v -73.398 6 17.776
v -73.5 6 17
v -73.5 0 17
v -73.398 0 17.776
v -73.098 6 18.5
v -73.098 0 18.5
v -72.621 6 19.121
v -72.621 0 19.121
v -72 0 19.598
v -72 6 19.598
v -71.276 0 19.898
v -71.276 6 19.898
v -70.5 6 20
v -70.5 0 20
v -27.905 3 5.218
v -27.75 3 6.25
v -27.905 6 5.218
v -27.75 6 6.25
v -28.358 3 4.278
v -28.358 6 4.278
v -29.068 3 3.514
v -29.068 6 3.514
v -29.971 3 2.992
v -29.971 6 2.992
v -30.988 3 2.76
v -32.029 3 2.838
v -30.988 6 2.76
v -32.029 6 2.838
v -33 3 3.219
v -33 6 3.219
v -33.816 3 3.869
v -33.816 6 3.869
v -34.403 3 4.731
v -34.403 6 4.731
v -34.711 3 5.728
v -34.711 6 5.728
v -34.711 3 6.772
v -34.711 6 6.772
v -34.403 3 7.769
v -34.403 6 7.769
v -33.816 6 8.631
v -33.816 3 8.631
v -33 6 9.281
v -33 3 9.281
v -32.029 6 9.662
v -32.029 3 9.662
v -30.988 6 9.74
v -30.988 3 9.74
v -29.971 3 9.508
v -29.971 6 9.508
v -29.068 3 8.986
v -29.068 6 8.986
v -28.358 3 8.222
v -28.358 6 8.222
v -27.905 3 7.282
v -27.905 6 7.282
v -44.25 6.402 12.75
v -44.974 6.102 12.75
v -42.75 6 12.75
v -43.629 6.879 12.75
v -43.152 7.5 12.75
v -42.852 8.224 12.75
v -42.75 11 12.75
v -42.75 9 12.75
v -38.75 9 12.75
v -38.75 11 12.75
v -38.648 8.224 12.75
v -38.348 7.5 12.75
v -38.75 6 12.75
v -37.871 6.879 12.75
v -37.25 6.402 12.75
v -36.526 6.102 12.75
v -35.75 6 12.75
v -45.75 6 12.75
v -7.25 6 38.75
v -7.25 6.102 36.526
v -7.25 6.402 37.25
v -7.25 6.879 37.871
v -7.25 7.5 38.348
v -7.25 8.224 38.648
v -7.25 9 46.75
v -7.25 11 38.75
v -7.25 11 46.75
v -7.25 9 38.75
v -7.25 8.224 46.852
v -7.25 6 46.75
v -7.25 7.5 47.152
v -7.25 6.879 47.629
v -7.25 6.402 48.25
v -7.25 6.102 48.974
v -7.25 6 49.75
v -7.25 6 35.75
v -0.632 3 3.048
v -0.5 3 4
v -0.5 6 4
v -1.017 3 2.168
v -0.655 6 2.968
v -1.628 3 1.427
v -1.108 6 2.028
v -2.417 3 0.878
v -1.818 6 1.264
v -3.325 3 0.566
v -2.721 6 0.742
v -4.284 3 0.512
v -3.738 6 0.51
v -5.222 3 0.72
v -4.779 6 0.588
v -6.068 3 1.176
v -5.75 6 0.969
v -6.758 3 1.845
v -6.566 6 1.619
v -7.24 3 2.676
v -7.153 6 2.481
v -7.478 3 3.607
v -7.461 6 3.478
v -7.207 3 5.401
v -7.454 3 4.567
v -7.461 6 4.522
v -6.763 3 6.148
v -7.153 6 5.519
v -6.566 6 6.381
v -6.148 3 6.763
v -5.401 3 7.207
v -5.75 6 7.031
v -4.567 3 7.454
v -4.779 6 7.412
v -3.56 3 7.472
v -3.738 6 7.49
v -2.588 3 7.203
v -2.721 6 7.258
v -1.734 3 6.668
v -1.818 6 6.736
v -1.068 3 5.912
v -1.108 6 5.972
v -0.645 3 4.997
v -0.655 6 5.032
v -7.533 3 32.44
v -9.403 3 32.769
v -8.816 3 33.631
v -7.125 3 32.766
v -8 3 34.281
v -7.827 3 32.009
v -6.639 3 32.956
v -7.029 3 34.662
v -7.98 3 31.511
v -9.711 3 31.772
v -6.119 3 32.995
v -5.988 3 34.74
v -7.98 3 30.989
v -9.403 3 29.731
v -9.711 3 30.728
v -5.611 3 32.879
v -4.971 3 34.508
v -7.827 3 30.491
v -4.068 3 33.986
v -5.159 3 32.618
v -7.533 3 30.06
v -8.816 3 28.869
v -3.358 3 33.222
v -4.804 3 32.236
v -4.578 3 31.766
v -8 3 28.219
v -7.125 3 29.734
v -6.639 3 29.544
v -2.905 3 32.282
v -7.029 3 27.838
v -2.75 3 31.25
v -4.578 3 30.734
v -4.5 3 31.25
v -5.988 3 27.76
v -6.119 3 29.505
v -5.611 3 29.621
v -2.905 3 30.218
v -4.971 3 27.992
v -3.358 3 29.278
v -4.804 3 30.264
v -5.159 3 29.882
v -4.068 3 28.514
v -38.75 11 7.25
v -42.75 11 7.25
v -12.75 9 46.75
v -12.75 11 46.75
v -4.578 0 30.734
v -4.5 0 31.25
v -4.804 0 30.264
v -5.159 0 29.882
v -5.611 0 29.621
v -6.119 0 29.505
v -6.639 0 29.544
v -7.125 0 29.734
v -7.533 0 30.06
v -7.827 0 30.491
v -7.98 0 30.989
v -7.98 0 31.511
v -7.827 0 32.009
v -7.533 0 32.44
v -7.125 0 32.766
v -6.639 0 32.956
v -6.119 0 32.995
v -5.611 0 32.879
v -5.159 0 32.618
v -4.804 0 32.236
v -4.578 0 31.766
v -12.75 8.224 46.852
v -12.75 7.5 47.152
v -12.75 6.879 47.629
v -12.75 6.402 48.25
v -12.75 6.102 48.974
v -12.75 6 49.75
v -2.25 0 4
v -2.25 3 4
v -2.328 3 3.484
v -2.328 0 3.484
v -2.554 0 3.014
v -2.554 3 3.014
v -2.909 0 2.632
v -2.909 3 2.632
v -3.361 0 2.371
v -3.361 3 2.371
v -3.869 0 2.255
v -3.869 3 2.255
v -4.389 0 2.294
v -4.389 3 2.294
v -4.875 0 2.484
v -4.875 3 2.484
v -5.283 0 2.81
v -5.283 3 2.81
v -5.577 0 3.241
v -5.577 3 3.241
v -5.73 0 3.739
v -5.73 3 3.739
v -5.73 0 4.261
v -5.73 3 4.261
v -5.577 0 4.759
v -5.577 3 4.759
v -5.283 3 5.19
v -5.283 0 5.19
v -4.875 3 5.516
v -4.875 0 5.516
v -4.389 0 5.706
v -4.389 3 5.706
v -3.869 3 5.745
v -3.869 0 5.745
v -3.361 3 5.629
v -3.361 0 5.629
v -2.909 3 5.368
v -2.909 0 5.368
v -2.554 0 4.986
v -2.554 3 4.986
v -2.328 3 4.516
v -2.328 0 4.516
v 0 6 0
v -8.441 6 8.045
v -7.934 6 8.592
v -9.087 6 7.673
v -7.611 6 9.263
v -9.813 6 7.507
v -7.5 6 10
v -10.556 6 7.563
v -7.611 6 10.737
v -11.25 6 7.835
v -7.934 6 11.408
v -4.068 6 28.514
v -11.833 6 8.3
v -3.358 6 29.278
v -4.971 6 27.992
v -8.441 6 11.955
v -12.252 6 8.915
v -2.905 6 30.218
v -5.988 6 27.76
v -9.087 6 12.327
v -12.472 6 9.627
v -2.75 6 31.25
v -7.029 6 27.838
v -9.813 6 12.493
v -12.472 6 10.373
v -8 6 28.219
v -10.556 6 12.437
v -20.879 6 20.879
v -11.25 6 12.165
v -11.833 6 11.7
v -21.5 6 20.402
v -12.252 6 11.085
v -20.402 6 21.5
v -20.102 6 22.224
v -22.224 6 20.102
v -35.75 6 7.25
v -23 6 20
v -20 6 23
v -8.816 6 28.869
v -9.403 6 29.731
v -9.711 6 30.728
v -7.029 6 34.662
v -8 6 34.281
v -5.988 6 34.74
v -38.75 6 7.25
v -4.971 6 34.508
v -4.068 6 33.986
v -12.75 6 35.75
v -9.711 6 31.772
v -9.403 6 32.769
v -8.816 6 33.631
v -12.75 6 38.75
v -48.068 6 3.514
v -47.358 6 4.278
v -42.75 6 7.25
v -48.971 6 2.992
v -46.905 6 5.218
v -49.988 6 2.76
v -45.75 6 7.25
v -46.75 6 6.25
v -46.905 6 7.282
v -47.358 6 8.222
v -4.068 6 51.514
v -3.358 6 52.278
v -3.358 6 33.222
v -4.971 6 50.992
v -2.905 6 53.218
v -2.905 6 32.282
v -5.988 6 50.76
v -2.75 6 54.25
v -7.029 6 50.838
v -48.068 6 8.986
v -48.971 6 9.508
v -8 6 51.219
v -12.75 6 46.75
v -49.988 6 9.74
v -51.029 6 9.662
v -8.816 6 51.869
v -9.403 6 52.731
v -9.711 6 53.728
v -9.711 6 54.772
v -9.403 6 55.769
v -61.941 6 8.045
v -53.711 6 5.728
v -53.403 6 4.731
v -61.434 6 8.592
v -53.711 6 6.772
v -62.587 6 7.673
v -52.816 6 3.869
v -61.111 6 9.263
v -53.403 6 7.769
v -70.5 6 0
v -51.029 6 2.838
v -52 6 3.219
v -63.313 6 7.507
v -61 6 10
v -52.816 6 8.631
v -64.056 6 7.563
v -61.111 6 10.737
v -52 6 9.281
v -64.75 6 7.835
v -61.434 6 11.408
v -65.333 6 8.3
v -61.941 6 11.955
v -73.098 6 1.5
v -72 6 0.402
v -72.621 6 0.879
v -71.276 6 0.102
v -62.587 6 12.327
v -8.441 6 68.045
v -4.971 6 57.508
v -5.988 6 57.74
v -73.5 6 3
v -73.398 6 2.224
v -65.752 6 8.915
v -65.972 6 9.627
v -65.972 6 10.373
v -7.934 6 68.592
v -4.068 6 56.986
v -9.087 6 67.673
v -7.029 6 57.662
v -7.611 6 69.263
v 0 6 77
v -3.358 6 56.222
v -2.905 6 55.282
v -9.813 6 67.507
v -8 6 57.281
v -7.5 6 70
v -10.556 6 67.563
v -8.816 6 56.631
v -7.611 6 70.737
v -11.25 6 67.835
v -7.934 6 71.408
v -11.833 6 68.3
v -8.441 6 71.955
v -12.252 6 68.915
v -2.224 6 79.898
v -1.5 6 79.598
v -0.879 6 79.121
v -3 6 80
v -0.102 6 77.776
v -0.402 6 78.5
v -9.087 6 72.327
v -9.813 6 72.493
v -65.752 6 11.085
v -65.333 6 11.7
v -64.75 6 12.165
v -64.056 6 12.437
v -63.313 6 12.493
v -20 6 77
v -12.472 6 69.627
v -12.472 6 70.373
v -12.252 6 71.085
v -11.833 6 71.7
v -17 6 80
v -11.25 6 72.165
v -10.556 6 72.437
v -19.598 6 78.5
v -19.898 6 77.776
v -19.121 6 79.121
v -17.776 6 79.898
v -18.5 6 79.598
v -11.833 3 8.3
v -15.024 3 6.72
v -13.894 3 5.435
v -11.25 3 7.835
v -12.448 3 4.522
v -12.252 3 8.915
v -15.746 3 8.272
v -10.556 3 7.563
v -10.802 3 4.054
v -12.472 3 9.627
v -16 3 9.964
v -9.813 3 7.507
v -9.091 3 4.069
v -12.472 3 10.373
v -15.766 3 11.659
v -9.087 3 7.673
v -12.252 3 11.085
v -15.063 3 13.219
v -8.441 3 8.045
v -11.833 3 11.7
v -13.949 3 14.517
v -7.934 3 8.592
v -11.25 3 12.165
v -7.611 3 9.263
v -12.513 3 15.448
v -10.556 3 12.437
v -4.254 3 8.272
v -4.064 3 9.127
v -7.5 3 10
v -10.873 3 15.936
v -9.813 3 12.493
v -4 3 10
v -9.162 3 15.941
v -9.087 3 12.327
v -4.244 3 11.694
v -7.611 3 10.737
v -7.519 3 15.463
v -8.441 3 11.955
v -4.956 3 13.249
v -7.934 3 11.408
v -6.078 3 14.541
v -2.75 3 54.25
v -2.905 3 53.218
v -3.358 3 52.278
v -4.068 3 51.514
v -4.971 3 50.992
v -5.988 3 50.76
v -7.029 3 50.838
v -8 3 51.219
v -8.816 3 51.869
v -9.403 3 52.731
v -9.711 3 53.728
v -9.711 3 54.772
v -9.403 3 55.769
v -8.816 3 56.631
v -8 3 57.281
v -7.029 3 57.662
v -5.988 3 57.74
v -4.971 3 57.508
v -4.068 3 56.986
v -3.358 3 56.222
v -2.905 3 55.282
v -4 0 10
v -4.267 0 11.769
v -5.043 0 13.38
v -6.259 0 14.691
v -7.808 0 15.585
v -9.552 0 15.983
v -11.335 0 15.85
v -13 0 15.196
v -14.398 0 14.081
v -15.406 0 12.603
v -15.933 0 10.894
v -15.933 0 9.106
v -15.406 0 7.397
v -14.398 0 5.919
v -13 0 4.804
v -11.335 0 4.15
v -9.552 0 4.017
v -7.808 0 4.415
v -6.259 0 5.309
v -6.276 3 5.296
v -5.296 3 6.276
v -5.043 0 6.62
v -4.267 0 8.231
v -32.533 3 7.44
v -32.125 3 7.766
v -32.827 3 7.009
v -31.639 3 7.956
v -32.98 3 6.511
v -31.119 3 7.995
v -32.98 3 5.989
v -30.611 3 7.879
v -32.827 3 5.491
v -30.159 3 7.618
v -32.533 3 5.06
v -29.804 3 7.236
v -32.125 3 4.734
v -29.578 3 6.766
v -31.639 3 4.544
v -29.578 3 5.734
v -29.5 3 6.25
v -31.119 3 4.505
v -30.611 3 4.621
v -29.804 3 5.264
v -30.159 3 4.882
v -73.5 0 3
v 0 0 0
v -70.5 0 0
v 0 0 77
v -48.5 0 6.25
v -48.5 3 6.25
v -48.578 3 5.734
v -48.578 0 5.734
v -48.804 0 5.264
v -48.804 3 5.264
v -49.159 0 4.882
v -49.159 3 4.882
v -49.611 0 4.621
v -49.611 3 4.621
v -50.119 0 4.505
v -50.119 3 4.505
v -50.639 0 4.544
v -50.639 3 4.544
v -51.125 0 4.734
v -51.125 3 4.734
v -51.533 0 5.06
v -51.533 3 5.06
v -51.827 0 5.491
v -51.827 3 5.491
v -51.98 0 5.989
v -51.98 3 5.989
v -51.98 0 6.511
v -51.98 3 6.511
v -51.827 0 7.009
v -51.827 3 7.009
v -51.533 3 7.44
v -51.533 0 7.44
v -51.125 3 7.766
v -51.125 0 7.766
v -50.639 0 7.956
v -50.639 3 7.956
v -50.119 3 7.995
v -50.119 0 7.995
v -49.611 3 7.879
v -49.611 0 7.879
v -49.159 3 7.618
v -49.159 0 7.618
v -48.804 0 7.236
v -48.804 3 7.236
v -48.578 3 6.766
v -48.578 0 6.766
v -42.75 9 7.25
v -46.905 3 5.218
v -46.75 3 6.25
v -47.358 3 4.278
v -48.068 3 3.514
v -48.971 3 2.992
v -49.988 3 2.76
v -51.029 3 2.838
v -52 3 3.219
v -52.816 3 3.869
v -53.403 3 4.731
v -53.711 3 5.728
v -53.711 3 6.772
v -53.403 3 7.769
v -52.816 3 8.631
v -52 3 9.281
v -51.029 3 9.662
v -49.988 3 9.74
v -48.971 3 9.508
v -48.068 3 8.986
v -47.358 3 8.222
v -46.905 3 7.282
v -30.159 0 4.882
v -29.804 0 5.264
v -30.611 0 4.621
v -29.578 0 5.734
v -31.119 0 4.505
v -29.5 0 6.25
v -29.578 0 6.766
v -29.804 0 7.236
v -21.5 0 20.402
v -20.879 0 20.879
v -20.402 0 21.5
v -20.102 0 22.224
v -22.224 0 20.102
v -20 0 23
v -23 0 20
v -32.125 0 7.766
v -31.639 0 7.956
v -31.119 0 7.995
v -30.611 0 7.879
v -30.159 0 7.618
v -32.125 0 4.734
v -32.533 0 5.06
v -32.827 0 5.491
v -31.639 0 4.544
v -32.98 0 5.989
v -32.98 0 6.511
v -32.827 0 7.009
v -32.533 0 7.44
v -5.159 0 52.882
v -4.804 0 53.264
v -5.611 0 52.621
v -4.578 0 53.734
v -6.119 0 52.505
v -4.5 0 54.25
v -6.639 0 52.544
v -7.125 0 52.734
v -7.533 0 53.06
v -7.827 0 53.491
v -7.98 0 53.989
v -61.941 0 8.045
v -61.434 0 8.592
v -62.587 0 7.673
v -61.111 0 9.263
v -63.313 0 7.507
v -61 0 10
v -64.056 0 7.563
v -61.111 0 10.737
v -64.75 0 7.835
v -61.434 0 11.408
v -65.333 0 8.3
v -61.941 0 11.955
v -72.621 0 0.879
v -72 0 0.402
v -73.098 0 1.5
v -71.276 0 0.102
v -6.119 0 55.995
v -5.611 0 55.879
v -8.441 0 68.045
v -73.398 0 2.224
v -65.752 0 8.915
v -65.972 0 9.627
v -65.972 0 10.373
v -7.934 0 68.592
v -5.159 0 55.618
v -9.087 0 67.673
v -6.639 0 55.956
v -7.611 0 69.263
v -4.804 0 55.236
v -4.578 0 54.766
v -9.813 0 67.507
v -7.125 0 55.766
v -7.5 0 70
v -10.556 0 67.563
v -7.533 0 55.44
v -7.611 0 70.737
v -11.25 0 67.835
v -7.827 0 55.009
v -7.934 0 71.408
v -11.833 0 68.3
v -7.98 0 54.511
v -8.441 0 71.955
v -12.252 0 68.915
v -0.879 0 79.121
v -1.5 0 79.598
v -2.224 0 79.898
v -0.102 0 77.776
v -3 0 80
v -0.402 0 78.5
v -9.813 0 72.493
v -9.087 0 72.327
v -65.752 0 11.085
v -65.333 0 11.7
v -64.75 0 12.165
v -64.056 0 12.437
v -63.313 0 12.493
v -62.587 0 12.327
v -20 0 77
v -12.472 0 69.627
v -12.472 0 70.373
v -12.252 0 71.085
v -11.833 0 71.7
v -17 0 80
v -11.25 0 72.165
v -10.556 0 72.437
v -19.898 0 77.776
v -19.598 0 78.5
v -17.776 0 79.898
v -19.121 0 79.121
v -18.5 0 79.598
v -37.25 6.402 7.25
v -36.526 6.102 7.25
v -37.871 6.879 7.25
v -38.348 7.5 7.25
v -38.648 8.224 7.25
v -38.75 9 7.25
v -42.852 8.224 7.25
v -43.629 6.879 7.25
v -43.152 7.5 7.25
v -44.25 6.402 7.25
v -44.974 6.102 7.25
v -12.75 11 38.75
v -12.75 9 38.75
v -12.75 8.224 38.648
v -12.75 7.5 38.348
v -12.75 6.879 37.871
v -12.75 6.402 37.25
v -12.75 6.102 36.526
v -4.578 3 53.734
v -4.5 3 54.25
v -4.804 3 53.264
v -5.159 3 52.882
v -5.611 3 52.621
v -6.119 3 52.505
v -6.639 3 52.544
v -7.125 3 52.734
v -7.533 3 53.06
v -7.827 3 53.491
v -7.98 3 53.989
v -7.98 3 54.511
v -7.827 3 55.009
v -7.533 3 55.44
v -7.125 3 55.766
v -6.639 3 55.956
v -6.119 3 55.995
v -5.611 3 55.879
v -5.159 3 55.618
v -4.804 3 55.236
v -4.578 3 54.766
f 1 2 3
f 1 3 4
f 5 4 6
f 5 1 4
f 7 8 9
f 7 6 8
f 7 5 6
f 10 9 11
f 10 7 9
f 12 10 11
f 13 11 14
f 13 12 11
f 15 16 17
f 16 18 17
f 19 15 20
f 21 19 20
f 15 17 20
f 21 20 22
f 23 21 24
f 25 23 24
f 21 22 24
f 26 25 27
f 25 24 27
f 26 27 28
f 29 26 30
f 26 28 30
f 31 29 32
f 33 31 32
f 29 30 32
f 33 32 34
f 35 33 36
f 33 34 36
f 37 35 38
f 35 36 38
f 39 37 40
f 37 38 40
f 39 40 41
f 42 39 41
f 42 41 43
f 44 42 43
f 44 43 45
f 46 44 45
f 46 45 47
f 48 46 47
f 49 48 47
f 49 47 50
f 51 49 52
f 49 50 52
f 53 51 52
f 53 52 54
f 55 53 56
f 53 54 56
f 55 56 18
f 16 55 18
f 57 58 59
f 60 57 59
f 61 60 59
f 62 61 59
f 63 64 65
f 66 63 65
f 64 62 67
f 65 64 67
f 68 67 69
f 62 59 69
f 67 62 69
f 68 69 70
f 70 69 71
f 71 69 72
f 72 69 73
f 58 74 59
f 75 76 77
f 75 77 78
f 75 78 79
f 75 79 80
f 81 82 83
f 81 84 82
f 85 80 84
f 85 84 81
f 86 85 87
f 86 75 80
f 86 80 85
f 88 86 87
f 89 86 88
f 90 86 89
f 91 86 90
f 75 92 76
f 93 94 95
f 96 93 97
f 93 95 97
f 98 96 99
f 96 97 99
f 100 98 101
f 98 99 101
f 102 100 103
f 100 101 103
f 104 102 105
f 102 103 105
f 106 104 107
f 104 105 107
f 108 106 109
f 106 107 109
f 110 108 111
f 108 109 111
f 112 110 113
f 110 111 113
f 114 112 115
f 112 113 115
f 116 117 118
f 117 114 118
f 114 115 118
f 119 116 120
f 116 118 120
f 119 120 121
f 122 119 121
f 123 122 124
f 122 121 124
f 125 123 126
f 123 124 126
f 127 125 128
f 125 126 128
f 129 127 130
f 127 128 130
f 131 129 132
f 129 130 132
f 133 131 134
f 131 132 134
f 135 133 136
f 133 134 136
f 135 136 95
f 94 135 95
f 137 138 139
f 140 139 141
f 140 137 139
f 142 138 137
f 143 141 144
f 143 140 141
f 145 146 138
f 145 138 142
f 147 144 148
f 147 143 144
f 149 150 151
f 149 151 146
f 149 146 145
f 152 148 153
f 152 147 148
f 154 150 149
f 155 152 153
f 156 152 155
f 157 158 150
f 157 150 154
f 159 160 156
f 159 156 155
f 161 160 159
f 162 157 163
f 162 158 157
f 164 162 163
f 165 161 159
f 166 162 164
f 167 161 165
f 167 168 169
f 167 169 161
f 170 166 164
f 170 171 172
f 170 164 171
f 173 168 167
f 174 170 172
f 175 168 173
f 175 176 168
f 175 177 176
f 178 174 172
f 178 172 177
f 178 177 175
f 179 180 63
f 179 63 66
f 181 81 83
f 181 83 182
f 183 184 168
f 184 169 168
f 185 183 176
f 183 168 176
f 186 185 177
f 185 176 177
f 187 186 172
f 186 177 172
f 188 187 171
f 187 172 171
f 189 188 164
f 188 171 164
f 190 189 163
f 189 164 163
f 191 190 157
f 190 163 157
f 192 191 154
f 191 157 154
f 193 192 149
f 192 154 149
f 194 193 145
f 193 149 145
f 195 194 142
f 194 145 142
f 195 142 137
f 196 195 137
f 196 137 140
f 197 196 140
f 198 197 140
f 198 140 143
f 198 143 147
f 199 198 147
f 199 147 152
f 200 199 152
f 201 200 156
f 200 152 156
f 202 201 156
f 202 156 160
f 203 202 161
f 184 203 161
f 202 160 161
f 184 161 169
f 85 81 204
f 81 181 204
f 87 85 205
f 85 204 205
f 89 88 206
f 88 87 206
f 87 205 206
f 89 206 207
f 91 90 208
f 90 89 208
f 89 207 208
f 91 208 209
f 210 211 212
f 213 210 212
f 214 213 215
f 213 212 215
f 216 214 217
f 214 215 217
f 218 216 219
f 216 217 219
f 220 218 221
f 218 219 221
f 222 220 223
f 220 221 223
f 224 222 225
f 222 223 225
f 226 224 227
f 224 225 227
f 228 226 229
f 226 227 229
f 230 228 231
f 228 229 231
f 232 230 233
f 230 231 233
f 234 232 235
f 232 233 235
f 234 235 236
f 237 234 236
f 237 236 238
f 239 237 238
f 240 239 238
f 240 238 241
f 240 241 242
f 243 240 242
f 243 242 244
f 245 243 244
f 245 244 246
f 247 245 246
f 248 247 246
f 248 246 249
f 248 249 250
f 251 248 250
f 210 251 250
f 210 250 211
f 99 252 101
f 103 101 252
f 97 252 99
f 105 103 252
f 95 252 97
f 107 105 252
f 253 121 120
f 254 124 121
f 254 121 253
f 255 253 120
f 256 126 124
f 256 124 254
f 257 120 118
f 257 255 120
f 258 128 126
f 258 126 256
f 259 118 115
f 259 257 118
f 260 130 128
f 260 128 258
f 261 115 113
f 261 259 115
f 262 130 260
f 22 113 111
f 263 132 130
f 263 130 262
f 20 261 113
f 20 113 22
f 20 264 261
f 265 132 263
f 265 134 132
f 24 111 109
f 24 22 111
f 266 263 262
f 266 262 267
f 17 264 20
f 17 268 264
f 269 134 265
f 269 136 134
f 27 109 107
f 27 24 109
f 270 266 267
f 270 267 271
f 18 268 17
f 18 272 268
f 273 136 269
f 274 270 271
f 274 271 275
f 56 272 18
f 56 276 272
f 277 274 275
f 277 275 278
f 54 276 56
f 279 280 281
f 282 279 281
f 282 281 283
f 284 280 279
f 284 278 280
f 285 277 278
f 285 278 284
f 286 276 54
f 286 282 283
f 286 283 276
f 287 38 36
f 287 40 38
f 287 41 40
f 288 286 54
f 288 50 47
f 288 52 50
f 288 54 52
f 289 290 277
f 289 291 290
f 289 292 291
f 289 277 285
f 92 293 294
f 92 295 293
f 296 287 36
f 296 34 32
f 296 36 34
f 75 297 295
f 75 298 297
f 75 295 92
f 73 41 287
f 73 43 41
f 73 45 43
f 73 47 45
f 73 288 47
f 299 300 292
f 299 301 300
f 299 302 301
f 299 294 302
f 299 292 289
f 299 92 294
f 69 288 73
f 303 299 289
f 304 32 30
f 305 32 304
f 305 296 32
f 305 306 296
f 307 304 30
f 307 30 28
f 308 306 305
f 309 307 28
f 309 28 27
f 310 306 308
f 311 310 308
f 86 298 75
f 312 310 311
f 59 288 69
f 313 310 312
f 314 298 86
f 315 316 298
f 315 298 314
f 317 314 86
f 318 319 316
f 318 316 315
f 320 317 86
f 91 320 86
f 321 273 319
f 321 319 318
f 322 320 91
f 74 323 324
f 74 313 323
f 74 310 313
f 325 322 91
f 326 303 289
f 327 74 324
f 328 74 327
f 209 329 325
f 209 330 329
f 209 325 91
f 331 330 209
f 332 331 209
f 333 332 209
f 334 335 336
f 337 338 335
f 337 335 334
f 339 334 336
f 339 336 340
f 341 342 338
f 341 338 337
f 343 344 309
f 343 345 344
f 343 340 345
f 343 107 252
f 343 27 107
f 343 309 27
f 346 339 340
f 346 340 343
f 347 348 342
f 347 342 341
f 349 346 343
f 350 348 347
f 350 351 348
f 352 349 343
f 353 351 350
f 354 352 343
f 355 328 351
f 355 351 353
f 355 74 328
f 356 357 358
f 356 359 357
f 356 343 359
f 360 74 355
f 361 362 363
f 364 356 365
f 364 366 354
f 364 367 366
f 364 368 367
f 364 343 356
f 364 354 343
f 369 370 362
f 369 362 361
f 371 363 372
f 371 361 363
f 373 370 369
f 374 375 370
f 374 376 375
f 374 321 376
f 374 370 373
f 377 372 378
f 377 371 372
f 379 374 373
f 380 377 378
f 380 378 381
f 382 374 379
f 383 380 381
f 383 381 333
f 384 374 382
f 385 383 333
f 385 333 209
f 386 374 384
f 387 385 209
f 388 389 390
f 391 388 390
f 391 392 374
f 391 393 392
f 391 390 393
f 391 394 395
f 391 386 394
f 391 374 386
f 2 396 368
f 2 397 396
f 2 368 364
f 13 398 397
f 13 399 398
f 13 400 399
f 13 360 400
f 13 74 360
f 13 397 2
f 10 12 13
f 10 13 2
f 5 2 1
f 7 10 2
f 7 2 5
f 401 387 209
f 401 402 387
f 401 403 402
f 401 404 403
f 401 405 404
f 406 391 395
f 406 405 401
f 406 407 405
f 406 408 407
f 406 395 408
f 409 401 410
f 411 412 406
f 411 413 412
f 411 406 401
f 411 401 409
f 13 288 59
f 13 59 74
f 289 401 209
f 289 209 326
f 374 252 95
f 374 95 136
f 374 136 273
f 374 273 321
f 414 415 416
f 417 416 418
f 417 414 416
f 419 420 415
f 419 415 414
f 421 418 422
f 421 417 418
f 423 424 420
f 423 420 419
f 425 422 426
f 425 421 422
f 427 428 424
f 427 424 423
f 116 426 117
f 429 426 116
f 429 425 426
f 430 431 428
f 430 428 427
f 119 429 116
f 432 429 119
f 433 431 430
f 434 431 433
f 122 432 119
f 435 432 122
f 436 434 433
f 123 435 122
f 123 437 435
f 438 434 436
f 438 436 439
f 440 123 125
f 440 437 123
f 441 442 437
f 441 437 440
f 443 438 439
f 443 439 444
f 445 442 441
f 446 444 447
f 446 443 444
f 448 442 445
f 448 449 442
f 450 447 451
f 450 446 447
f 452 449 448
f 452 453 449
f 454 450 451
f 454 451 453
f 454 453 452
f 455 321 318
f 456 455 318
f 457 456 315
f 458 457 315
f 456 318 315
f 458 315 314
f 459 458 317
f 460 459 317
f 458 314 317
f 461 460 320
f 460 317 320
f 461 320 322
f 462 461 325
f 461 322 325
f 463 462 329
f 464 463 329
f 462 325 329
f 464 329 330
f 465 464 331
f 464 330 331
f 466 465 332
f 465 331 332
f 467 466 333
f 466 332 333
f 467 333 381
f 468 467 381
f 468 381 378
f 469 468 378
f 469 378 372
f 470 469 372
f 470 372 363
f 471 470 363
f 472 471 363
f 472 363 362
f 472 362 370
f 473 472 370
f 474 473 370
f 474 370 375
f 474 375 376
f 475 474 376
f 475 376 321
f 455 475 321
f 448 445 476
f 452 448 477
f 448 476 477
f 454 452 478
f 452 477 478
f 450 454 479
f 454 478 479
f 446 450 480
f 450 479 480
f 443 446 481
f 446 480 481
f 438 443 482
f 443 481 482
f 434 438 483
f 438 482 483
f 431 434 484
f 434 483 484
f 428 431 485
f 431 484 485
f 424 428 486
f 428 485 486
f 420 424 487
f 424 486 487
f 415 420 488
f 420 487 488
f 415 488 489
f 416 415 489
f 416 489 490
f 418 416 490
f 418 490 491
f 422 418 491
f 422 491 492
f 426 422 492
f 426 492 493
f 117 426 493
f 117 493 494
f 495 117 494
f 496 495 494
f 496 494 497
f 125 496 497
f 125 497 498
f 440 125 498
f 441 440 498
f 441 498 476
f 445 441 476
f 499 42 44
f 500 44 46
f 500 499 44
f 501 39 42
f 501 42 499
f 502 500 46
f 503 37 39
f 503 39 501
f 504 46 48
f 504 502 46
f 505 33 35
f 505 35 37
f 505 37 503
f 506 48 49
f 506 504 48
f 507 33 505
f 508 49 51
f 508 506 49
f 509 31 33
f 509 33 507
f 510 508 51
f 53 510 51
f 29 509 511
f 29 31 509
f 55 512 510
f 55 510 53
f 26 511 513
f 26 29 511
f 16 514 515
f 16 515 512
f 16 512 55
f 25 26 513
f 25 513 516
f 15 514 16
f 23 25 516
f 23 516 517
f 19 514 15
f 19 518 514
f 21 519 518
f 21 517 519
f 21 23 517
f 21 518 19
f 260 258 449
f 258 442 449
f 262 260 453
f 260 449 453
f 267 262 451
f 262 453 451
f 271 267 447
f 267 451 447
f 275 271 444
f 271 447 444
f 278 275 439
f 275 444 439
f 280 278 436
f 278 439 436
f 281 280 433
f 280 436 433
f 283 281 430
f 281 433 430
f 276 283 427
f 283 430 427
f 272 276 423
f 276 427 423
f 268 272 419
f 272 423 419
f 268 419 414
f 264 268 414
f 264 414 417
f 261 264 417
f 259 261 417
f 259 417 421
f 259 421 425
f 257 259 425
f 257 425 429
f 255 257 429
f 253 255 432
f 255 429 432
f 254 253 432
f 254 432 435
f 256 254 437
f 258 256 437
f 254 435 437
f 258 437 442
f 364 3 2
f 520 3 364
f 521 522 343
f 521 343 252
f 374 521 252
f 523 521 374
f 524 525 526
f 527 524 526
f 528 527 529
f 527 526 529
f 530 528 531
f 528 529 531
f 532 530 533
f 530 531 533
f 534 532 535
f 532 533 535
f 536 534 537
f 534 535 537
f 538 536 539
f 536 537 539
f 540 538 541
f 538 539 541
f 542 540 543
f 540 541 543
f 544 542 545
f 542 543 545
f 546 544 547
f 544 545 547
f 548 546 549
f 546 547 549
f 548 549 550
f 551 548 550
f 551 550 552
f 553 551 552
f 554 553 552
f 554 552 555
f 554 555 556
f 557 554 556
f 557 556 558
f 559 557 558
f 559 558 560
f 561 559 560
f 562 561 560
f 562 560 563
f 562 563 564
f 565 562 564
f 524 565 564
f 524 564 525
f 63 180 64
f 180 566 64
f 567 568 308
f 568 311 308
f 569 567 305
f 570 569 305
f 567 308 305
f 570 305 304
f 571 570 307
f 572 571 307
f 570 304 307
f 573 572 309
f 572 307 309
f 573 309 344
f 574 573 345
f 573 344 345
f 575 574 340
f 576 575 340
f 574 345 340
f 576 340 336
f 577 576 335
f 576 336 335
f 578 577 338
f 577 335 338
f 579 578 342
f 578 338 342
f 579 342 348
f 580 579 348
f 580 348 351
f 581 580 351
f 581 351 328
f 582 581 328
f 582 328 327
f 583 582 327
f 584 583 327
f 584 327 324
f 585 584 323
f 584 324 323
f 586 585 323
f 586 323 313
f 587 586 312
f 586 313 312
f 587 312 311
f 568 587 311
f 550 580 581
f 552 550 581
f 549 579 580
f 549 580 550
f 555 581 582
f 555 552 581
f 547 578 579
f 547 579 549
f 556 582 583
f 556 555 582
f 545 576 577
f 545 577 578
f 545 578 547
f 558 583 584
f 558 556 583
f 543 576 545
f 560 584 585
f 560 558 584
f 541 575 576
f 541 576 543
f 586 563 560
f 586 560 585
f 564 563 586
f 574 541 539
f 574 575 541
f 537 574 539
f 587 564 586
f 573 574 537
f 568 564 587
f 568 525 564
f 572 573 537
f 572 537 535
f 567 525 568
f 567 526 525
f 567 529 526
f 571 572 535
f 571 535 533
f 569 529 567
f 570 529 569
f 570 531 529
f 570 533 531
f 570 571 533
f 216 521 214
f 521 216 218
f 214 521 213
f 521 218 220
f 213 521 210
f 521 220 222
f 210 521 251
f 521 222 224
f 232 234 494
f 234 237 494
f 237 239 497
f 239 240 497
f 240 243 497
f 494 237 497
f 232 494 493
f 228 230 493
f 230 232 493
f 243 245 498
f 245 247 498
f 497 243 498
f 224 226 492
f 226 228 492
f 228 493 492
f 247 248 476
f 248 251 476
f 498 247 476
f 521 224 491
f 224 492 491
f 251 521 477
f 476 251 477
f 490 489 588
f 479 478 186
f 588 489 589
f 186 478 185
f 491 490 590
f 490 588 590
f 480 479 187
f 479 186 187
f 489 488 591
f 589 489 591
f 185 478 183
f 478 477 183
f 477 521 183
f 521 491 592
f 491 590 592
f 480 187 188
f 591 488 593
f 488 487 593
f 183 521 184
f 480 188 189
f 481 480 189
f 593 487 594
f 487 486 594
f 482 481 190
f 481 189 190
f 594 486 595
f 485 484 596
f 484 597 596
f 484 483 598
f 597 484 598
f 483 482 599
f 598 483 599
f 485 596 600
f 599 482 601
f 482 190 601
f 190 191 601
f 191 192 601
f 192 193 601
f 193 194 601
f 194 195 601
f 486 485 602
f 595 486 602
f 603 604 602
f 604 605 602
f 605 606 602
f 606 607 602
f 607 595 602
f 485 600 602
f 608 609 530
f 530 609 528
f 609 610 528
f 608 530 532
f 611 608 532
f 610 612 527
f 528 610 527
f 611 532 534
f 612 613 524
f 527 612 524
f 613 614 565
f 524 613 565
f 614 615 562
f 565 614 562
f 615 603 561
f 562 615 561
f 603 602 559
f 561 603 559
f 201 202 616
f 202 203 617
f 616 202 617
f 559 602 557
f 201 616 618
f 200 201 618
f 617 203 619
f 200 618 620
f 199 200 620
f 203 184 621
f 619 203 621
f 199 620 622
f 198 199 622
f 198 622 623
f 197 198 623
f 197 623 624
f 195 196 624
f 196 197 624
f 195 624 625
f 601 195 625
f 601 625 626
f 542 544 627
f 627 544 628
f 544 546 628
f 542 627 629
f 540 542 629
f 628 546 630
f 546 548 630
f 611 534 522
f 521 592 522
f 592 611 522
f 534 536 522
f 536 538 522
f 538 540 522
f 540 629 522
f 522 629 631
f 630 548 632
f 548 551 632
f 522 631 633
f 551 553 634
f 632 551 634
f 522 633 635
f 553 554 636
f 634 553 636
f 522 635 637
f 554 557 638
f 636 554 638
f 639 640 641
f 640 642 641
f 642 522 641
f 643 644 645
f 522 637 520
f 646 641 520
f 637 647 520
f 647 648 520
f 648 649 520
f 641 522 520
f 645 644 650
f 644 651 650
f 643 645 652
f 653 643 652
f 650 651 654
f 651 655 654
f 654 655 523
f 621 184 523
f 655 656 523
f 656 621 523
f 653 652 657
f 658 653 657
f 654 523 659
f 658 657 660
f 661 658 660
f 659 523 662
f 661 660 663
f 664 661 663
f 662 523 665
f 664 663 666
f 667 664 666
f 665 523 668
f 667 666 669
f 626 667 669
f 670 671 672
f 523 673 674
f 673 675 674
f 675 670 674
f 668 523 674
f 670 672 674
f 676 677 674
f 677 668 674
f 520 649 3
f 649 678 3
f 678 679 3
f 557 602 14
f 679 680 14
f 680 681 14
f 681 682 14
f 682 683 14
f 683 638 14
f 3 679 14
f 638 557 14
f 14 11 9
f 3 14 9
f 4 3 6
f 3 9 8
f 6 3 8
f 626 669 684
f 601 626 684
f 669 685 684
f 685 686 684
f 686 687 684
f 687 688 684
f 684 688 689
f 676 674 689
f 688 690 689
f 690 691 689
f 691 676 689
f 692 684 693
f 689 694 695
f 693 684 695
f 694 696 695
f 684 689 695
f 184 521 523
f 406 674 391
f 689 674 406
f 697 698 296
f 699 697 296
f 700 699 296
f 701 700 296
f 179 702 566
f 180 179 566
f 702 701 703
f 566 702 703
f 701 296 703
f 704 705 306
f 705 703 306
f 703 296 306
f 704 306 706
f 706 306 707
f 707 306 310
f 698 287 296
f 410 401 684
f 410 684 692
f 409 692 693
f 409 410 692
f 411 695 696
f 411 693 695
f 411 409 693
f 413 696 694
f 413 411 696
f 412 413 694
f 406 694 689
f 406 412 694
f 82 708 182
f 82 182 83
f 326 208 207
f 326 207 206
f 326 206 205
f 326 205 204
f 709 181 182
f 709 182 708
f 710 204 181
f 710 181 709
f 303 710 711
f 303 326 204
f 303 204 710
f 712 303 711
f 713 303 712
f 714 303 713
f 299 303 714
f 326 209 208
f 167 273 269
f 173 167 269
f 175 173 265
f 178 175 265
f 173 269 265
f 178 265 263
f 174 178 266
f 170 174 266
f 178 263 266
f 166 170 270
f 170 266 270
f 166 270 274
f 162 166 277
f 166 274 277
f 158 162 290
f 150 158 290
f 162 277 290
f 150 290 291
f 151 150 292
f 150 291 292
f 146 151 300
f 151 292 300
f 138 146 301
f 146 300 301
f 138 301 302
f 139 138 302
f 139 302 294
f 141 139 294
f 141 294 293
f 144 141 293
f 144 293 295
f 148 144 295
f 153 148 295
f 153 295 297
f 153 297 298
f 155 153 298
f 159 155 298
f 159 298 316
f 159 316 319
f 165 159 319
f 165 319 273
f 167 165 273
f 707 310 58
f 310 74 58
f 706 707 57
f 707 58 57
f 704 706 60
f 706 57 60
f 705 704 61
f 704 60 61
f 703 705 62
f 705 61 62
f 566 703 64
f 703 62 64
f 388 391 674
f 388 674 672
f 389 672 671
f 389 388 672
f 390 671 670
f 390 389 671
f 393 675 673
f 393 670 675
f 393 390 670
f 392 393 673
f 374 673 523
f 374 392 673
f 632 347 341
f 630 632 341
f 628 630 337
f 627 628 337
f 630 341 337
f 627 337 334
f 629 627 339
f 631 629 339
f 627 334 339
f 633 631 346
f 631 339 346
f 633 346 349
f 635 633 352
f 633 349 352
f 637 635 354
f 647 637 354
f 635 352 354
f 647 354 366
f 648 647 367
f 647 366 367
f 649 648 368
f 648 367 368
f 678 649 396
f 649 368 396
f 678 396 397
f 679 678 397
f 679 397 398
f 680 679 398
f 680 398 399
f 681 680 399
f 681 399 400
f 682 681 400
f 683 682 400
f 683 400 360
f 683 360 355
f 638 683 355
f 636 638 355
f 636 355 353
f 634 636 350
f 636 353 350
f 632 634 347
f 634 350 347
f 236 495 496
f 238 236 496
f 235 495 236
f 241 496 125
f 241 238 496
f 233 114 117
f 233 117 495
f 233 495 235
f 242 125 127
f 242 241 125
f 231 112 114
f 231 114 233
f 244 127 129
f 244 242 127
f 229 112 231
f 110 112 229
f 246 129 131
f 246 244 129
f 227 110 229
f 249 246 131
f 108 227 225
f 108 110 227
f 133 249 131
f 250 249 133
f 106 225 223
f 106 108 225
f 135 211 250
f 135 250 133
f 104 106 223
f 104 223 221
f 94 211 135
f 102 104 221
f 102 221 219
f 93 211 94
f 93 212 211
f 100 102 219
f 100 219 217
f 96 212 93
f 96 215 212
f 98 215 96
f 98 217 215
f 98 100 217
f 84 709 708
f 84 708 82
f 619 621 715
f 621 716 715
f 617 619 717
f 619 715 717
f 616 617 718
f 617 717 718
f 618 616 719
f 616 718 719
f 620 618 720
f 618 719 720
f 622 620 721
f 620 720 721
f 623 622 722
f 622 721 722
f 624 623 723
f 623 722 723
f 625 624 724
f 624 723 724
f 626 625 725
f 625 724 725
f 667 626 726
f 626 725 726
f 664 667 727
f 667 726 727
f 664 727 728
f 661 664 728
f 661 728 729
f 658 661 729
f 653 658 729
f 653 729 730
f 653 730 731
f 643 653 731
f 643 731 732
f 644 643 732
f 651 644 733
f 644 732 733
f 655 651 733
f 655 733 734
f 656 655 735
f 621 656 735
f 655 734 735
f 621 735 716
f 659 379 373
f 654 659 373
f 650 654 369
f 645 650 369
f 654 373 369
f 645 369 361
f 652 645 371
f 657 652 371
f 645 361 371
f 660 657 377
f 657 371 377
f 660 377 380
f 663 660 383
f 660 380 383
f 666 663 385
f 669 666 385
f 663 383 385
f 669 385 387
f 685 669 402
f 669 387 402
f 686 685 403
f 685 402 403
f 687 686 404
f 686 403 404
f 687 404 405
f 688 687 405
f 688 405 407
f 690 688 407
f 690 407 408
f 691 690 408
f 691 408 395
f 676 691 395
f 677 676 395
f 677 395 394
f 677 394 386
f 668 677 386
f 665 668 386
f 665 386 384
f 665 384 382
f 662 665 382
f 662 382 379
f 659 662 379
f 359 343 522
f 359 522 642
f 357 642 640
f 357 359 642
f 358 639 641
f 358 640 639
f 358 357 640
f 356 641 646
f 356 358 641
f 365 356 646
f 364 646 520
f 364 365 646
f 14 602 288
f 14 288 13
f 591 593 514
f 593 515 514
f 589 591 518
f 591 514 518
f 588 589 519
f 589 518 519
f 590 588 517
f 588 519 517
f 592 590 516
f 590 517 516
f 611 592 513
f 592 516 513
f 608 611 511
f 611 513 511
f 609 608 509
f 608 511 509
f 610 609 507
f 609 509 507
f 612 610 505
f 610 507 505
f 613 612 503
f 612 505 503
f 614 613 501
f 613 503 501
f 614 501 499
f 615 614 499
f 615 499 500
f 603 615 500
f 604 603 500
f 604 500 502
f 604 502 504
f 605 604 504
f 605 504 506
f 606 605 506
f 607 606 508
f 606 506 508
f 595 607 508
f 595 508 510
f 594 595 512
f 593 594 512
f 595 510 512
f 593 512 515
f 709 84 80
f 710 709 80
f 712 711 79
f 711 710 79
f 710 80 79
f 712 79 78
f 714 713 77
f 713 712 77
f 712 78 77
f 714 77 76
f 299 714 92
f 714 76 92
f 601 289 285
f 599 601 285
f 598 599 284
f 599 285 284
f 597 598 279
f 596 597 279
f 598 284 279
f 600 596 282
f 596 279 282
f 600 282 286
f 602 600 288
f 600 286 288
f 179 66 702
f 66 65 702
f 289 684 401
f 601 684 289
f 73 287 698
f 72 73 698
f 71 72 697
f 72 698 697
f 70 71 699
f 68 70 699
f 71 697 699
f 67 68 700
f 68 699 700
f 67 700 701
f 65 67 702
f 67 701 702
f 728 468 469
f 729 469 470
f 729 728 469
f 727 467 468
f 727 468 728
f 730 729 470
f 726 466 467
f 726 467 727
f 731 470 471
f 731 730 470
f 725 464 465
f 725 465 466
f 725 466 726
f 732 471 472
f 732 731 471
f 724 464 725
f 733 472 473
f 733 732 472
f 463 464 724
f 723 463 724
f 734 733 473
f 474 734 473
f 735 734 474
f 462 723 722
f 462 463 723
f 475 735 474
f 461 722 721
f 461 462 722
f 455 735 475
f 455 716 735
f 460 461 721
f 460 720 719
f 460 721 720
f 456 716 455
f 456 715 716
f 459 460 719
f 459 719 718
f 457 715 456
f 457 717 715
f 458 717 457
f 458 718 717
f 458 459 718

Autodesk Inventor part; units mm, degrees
ref_plane "YZ Plane" through (0, 0, 0) normal (1, 0, 0) x (0, 1, 0)
ref_plane "XZ Plane" through (0, 0, 0) normal (0, 1, 0) x (-1, 0, 0)
ref_plane "XY Plane" through (0, 0, 0) normal (0, 0, 1) x (1, 0, 0)
sketch "Эскиз1" plane through (0, 0, 0) normal (0, 1, 0) x (-1, 0, 0)
  line L0 (0, 0) -> (0, 80)
  line L1 (0, 80) -> (20, 80)
  line L2 (20, 80) -> (20, 20)
  line L3 (20, 20) -> (73.5, 20)
  line L4 (73.5, 20) -> (73.5, 0)
  line L5 (73.5, 0) -> (0, 0)
  dimension "d0" = 80
  dimension "d1" = 20
  dimension "d2" = 60
  dimension "d3" = 53.5
extrude "Выдавливание1" add sketch "Эскиз1" along normal blind 6
fillet "Сопряжение1" radius 3 5 edges at (-73.5, 3, 20) (-73.5, 3, 0) (-20, 3, 80) (0, 3, 80) (-20, 3, 20)
sketch "Эскиз2" plane through (0, 6, 0) normal (0, 1, 0) x (1, 0, 0)
  circle A0 centre (-6.25, -31.25) radius 1.75
  circle A1 centre (-4, -4) radius 1.75
  circle A2 centre (-31.25, -6.25) radius 1.75
  circle A3 centre (-50.25, -6.25) radius 1.75
  circle A4 centre (-6.25, -54.25) radius 1.75
  circle A5 centre (-6.25, -54.25) radius 3.5
  circle A6 centre (-6.25, -31.25) radius 3.5
  circle A7 centre (-4, -4) radius 3.5
  circle A8 centre (-31.25, -6.25) radius 3.5
  circle A9 centre (-50.25, -6.25) radius 3.5
  dimension "d7" = 7
  dimension "d8" = 7
  dimension "d9" = 7
  dimension "d10" = 7
  dimension "d11" = 7
extrude "Выдавливание2" cut sketch "Эскиз2" against normal through all contours A0 | A1 | A2 | A3 | A4
extrude "Выдавливание3" cut sketch "Эскиз2" against normal blind 3 contours A0 | A1 | A2 | A3 | A4 | A5 | A6 | A7 | A8 | A9
sketch "Эскиз3" plane through (0, 6, 0) normal (0, 1, 0) x (1, 0, 0)
  line L0 (-20, -85.5935) -> (0, -85.5935)
  line L1 (-7.25, -46.75) -> (-12.75, -46.75)
  line L2 (-12.75, -46.75) -> (-12.75, -38.75)
  line L3 (-12.75, -38.75) -> (-7.25, -38.75)
  line L4 (-7.25, -38.75) -> (-7.25, -46.75)
  line L5 (-7.25, -46.75) -> (-12.75, -38.75) construction
  line L6 (-12.75, -46.75) -> (-7.25, -38.75) construction
  line L7 (0, 0) -> (13.4319, 0) construction
  line L8 (-42.75, -12.75) -> (-38.75, -12.75)
  line L9 (-38.75, -12.75) -> (-38.75, -7.25)
  line L10 (-38.75, -7.25) -> (-42.75, -7.25)
  line L11 (-42.75, -7.25) -> (-42.75, -12.75)
  point P0 (-10, -42.75)
extrude "Выдавливание4" add sketch "Эскиз3" along normal blind 5
sketch "Эскиз4" plane through (0, 6, 0) normal (0, 1, 0) x (1, 0, 0)
  line L0 (-27.1384, -80) -> (-27.1384, -70)
  line L1 (-80, 9.988) -> (-53.75, 9.988)
  circle A0 centre (-10, -70) radius 2.5
  line L2 (-73.5, -29.8806) -> (-63.5, -29.8806)
  circle A1 centre (-63.5, -10) radius 2.5
  point P0 (0, 0)
  dimension "d26" = 10
  dimension "d27" = 5
  dimension "d28" = 10
  dimension "d29" = 5
extrude "Выдавливание5" cut sketch "Эскиз4" against normal through all
sketch "Эскиз5" plane through (0, 0, 0) normal (0, -1, 0) x (1, 0, 0)
  line L0 (0, 77) -> (0, 0) projected
  line L1 (0, 0) -> (-10, 0)
  line L2 (-10, 0) -> (-10, 10)
  line L3 (-10, 10) -> (0, 10)
  line L4 (0, 10) -> (0, 0)
  circle A0 centre (-10, 10) radius 2.5
  circle A1 centre (-10, 10) radius 6
  dimension "d32" = 10
  dimension "d33" = 10
  dimension "d34" = 5
  dimension "d35" = 12
extrude "Выдавливание6" cut sketch "Эскиз5" against normal through all contours A0 L2 L3 | L3 L2 A0
extrude "Выдавливание7" cut sketch "Эскиз5" against normal blind 3 contours A1 L2 A0 L3 | L3 A0 L2 A1 | A0 L2 L3 | L3 L2 A0
fillet "Сопряжение2" radius 3 4 edges at (-42.75, 6, 10) (-38.75, 6, 10) (-10, 6, 38.75) (-10, 6, 46.75)
properties part number "perehodnik"
